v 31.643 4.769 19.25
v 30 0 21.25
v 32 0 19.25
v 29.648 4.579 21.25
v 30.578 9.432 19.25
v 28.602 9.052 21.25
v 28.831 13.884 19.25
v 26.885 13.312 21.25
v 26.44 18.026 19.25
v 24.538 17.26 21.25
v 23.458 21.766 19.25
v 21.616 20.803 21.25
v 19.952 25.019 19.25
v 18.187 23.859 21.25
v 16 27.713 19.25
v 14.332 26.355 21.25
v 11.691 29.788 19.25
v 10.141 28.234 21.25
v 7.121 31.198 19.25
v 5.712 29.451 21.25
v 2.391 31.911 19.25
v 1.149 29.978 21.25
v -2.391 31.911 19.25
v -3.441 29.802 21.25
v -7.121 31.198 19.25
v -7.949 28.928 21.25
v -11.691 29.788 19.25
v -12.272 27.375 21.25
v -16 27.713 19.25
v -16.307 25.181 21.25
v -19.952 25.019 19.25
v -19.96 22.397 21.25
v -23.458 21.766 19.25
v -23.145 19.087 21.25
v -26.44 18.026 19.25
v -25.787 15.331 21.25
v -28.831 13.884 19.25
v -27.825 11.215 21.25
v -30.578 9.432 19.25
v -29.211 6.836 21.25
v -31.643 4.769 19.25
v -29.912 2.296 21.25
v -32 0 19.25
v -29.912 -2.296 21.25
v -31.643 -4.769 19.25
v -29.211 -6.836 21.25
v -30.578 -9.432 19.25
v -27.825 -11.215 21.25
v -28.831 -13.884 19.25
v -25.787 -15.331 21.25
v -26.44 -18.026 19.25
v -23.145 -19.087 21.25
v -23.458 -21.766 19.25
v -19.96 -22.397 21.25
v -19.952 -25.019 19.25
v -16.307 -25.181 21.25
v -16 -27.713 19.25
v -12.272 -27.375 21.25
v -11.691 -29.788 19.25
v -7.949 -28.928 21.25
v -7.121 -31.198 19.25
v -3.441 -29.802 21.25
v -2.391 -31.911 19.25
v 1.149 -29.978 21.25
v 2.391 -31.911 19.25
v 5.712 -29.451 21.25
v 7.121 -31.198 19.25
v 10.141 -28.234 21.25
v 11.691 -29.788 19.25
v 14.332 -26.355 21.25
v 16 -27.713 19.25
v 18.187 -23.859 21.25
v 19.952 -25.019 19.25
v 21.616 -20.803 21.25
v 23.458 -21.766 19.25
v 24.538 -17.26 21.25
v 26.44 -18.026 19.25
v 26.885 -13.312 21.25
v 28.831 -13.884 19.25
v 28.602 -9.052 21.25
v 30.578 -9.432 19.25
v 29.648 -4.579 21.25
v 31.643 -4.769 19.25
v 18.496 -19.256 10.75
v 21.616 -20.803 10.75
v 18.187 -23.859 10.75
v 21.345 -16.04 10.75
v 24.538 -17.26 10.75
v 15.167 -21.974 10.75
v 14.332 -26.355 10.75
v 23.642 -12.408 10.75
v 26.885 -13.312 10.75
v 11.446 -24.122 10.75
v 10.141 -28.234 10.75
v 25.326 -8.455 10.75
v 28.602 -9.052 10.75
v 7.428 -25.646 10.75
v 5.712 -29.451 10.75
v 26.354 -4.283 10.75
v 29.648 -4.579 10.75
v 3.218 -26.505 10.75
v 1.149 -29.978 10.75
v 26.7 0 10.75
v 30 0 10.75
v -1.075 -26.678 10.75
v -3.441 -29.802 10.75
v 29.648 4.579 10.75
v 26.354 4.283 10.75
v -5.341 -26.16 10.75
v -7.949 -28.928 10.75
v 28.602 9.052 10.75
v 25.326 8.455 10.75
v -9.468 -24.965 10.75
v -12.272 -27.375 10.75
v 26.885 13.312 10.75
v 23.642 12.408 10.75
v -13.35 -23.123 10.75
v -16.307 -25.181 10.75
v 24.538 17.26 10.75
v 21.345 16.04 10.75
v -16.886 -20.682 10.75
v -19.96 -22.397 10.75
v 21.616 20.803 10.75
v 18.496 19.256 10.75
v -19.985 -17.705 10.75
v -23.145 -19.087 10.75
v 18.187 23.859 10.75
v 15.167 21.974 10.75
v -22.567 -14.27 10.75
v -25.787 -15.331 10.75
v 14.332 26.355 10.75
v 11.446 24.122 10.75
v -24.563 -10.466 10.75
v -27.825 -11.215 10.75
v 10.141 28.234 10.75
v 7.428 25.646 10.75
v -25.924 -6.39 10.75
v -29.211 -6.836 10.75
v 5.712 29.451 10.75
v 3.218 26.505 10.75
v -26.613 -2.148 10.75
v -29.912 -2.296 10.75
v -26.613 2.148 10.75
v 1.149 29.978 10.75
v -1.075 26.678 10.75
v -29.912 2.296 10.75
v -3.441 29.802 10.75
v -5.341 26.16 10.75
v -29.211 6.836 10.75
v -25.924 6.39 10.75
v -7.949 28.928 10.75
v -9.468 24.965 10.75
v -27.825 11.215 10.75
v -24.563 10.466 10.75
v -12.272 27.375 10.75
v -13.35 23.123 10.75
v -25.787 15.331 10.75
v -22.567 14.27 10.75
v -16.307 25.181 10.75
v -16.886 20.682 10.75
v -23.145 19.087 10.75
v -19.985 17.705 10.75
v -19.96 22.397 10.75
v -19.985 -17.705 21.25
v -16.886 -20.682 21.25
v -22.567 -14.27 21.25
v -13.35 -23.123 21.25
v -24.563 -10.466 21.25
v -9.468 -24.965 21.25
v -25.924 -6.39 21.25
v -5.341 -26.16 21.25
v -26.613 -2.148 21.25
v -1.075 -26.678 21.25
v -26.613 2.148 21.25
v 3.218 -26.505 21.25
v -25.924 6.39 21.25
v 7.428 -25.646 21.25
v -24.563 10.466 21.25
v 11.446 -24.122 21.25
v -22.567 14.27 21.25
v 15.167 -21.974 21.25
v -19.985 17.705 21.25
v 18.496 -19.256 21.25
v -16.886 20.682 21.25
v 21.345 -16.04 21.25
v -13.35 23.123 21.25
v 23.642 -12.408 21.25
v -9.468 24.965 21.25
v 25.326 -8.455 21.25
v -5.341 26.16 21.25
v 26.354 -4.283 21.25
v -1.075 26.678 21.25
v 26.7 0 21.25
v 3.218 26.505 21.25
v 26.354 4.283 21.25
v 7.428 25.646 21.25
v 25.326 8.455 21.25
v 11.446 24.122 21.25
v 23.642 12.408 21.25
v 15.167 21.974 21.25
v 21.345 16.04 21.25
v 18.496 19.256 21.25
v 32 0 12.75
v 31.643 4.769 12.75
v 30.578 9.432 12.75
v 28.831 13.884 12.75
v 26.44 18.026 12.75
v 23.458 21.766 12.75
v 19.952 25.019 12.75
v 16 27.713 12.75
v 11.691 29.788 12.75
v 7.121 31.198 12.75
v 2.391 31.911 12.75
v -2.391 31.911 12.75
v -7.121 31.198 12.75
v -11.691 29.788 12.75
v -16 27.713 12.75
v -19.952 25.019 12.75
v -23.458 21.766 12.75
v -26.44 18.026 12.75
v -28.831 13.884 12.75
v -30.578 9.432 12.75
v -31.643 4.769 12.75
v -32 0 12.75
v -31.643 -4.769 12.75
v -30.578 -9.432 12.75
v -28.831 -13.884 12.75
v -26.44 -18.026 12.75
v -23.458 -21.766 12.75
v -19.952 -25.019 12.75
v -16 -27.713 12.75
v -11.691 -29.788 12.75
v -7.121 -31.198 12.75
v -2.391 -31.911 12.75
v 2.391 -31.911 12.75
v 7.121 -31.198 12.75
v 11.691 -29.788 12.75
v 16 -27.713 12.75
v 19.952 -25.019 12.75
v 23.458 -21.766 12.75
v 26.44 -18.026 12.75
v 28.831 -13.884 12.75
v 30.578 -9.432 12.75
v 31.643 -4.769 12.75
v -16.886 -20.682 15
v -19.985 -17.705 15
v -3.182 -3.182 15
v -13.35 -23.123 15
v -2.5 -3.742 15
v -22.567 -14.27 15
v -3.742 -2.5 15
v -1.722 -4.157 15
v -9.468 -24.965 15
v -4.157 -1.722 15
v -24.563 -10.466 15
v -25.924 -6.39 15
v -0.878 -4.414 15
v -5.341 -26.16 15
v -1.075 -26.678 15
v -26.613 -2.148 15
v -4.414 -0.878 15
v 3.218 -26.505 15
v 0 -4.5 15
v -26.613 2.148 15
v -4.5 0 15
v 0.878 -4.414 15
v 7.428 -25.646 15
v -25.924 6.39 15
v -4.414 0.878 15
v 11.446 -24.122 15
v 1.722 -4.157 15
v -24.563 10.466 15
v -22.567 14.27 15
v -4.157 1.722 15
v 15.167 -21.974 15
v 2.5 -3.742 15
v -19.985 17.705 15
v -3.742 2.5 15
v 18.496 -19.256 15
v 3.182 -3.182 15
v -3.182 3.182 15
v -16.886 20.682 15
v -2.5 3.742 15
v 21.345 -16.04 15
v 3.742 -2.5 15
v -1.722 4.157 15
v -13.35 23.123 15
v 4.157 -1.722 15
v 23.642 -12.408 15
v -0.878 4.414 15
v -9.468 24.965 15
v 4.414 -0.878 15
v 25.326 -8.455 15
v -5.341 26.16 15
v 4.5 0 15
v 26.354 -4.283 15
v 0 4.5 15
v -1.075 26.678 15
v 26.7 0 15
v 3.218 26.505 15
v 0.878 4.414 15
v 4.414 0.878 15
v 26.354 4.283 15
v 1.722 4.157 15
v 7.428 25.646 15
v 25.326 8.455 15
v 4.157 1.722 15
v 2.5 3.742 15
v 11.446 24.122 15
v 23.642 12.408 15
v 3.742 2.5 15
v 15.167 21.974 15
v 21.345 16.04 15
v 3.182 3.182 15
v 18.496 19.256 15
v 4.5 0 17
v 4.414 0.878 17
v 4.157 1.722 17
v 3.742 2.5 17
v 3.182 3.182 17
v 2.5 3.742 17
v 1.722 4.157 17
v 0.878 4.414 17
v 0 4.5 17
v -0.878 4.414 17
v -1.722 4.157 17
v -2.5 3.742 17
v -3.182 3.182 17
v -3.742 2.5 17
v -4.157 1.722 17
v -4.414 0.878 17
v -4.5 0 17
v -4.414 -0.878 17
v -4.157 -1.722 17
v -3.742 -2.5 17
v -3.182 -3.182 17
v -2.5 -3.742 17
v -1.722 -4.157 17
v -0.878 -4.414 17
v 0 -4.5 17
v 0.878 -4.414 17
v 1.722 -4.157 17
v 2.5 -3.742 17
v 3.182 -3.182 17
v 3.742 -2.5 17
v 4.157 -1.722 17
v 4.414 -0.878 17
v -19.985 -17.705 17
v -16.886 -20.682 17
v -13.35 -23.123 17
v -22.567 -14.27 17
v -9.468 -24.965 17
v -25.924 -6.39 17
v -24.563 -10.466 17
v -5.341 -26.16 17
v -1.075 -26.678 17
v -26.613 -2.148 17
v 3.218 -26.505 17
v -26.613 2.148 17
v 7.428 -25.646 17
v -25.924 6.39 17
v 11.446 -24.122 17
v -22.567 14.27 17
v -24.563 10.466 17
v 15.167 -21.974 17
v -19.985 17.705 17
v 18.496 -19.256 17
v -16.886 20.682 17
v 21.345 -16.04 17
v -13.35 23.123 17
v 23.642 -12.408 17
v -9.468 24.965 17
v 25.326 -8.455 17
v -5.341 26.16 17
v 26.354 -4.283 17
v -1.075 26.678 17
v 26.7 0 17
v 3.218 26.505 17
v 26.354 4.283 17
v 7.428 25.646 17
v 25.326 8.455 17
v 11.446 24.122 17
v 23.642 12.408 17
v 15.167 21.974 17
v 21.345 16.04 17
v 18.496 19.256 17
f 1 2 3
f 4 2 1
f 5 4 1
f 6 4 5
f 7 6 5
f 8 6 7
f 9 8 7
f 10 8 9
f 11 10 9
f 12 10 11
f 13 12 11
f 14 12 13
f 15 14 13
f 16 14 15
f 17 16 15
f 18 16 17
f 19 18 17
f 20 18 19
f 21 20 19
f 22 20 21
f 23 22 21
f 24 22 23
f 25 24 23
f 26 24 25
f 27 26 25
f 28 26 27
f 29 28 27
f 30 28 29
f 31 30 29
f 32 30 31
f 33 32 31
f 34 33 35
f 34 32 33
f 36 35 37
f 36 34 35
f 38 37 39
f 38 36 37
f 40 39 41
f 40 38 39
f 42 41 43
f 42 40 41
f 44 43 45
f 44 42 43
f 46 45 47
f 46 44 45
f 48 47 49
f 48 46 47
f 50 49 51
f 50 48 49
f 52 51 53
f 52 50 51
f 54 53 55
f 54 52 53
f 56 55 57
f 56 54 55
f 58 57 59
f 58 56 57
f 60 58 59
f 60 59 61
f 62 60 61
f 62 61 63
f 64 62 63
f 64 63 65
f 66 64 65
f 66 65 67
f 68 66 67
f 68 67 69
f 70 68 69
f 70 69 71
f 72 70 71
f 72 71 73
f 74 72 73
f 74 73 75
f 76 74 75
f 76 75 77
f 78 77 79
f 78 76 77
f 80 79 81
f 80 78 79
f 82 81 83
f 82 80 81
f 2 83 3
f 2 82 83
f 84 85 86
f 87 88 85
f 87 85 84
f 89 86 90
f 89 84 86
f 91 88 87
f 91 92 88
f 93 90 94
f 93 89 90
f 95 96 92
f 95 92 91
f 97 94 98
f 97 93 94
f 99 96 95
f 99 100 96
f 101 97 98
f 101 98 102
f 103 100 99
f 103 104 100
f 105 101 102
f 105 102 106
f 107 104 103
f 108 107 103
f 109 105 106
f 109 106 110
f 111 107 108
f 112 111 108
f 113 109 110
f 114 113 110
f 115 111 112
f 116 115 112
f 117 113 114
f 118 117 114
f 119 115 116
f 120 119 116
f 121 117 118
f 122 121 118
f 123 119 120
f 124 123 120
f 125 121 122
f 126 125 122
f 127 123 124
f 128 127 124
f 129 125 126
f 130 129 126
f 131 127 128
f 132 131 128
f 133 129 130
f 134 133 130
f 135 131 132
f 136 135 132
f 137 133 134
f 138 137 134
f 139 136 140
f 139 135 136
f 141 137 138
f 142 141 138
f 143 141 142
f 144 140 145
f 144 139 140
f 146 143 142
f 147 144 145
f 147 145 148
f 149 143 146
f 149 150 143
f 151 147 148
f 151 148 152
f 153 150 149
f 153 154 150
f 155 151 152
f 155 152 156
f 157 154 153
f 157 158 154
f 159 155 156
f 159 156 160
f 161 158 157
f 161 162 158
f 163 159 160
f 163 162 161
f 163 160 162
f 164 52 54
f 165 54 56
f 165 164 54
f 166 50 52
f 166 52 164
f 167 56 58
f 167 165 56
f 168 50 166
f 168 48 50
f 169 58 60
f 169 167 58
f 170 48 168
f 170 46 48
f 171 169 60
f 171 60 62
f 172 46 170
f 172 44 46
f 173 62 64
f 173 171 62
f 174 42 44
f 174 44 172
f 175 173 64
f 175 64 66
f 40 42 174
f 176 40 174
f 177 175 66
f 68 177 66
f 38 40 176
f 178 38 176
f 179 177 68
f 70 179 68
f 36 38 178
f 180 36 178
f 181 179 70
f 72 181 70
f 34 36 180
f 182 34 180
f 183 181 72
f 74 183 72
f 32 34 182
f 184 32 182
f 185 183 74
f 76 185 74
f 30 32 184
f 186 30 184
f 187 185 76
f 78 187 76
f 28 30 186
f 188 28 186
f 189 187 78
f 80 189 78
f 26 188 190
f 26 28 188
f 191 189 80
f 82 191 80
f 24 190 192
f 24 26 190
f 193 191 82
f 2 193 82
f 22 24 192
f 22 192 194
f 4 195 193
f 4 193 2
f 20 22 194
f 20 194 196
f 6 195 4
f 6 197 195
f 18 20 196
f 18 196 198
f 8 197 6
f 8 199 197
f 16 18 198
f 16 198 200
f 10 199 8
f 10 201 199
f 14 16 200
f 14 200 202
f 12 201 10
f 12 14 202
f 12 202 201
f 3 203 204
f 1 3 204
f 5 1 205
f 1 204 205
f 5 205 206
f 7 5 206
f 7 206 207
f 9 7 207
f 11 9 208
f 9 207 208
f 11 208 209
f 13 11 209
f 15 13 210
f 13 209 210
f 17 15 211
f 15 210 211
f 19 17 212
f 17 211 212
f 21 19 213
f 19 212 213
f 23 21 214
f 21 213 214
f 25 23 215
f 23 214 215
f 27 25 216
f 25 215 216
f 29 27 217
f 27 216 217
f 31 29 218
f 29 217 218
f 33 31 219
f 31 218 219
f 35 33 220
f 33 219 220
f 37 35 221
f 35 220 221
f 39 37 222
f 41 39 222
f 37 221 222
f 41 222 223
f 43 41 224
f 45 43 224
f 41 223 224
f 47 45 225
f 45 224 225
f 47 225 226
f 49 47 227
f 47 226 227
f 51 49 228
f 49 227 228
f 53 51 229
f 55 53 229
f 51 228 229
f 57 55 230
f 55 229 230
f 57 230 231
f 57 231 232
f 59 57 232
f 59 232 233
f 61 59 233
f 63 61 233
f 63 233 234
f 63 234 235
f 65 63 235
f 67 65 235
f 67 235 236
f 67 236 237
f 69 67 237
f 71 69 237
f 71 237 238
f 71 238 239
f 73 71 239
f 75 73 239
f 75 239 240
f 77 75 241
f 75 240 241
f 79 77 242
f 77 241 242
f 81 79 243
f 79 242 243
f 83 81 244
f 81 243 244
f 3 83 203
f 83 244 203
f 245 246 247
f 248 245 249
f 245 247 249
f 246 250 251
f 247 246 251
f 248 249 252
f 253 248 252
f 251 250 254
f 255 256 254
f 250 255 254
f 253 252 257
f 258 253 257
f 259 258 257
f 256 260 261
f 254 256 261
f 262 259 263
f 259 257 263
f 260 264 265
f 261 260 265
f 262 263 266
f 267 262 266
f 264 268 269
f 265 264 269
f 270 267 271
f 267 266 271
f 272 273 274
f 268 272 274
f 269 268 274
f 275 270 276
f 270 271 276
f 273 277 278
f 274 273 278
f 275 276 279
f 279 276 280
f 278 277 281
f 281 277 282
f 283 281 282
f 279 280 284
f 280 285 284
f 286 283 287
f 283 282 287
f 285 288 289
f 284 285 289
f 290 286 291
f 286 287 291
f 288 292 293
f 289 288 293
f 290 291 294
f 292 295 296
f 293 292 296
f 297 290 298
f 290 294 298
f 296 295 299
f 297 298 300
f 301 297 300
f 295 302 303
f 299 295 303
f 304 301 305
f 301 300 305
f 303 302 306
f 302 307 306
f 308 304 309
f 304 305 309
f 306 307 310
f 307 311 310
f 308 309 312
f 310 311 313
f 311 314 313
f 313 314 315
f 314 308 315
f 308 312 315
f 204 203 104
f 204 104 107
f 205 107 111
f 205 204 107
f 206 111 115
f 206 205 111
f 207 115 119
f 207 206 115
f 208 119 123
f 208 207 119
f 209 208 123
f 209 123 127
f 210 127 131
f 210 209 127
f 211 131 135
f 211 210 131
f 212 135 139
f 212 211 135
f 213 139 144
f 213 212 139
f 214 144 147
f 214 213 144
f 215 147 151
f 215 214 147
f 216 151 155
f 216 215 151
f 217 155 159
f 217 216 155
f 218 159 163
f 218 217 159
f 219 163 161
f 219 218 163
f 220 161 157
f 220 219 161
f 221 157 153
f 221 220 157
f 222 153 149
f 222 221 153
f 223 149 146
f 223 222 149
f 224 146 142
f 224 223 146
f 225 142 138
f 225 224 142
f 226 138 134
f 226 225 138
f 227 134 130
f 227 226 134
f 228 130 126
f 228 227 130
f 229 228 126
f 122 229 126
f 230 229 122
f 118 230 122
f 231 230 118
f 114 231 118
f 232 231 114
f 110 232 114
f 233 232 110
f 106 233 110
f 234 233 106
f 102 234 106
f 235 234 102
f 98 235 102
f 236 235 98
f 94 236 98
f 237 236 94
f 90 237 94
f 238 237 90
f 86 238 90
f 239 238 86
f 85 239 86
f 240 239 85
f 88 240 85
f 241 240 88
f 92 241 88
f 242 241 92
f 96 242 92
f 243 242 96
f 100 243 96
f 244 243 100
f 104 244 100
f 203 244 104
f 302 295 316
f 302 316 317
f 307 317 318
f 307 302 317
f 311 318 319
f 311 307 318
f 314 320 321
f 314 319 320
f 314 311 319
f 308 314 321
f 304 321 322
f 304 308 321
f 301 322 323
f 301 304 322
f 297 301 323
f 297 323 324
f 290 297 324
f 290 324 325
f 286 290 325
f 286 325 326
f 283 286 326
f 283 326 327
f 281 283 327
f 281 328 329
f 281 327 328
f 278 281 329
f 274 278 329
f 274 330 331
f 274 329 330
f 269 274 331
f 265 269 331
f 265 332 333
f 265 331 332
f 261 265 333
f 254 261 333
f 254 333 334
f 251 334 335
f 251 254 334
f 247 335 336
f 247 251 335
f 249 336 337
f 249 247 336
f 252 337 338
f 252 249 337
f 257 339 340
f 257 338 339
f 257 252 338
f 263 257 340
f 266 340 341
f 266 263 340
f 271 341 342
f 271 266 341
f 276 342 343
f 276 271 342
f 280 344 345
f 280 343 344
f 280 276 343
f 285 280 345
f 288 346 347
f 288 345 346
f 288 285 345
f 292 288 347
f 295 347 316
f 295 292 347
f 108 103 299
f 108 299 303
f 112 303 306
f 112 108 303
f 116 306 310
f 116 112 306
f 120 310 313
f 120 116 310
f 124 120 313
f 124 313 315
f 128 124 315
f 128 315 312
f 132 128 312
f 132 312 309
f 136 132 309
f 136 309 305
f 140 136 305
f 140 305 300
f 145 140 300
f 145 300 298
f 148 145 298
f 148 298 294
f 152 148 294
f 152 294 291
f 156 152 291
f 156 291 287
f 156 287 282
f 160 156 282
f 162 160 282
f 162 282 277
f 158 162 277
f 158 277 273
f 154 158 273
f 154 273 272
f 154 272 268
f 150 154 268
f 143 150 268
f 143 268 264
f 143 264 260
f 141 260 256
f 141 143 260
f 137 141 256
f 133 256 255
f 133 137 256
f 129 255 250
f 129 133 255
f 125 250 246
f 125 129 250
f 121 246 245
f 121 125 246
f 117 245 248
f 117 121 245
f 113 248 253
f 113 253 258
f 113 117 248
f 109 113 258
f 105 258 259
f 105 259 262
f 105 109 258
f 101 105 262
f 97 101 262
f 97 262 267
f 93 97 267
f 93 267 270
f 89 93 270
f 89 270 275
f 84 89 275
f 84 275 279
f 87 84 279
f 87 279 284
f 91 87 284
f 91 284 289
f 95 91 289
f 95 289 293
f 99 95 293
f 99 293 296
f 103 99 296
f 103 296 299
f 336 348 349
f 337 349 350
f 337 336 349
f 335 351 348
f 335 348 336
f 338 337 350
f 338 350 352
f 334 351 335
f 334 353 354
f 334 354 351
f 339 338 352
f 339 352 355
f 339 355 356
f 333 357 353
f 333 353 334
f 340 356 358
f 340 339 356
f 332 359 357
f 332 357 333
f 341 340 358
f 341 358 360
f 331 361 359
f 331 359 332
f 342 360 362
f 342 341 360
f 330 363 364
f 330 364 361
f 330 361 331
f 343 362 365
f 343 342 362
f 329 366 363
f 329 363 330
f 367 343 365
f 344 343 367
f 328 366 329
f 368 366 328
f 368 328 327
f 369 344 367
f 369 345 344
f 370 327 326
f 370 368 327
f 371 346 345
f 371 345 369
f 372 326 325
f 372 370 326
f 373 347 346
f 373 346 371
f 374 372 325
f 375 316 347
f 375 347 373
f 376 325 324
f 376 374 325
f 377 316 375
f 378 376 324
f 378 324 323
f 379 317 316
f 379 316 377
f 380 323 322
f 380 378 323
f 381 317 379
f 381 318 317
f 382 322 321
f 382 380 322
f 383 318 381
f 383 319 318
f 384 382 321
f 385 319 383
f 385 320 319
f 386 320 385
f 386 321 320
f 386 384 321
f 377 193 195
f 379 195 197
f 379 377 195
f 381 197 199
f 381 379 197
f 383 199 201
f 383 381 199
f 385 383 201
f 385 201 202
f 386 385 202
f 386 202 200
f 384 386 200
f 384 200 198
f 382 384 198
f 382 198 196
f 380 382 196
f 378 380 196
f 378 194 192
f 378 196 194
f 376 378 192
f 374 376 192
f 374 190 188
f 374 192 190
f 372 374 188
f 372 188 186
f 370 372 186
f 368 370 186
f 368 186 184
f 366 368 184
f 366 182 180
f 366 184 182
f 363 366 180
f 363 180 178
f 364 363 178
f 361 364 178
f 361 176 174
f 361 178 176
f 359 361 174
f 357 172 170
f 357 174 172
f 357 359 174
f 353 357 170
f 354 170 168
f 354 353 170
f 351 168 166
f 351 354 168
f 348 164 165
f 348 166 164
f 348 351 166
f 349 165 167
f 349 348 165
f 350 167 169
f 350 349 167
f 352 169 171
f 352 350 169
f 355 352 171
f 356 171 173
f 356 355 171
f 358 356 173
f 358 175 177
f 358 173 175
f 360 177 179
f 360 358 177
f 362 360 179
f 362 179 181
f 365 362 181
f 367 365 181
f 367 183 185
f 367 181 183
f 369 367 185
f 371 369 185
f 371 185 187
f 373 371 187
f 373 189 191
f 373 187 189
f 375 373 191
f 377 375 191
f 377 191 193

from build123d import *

# Parameters (mm, degrees)
CYLINDER006_R     = 26.7
CYLINDER006_DEPTH = 7.25
CYLINDER007_R     = 4.5
CYLINDER007_DEPTH = 32
CYLINDER005_R     = 26.7
CYLINDER005_DEPTH = 7.25
CYLINDER004_R     = 32
CYLINDER004_DEPTH = 6.5


with BuildPart() as cylinder006:
    # Cylinder006 → Cylinder006 (new body)
    with BuildSketch(Plane.XY.offset(7.75)):
        Circle(CYLINDER006_R)
    extrude(amount=CYLINDER006_DEPTH)


with BuildPart() as cylinder007:
    # Cylinder007 → Cylinder007 (new body)
    with BuildSketch(Plane.XY):
        Circle(CYLINDER007_R)
    extrude(amount=CYLINDER007_DEPTH)


with BuildPart() as fusion003:
    # Cylinder005 → Cylinder005 (new body)
    with BuildSketch(Plane.XY.offset(17)):
        Circle(CYLINDER005_R)
    extrude(amount=CYLINDER005_DEPTH)

    # Fusion003: union Cylinder006, Cylinder007
    add(cylinder006.part)
    add(cylinder007.part)


with BuildPart() as cone002:
    # Cone002 → Cone002 (revolve)
    with BuildSketch(Plane(origin=(0, 0, 8.5), x_dir=(1, 0, 0), z_dir=(0, -1, 0))):
        Polygon((0, 0), (32, 0), (30, 2), (0, 2), align=None)
    revolve(axis=Axis((0, 0, 8.5), (0, 0, 1)))


with BuildPart() as cone003:
    # Cone003 → Cone003 (revolve)
    with BuildSketch(Plane.XZ):
        Polygon((0, 0), (30, 0), (32, 2), (0, 2), align=None)
    revolve(axis=Axis((0, 0, 0), (0, 0, 1)))


with BuildPart() as cut:
    # Cylinder004 → Cylinder004 (new body)
    with BuildSketch(Plane.XY.offset(2)):
        Circle(CYLINDER004_R)
    extrude(amount=CYLINDER004_DEPTH)

    # Fusion002: union Cone002, Cone003
    add(cone002.part)
    add(cone003.part)


with BuildPart() as cut_1:
    # Fusion002 placement: moved
    add(cut.part.moved(Location((0, 0, 10.75))))

    # Cut: cut Fusion003
    add(fusion003.part, mode=Mode.SUBTRACT)


solid = cut_1.part
